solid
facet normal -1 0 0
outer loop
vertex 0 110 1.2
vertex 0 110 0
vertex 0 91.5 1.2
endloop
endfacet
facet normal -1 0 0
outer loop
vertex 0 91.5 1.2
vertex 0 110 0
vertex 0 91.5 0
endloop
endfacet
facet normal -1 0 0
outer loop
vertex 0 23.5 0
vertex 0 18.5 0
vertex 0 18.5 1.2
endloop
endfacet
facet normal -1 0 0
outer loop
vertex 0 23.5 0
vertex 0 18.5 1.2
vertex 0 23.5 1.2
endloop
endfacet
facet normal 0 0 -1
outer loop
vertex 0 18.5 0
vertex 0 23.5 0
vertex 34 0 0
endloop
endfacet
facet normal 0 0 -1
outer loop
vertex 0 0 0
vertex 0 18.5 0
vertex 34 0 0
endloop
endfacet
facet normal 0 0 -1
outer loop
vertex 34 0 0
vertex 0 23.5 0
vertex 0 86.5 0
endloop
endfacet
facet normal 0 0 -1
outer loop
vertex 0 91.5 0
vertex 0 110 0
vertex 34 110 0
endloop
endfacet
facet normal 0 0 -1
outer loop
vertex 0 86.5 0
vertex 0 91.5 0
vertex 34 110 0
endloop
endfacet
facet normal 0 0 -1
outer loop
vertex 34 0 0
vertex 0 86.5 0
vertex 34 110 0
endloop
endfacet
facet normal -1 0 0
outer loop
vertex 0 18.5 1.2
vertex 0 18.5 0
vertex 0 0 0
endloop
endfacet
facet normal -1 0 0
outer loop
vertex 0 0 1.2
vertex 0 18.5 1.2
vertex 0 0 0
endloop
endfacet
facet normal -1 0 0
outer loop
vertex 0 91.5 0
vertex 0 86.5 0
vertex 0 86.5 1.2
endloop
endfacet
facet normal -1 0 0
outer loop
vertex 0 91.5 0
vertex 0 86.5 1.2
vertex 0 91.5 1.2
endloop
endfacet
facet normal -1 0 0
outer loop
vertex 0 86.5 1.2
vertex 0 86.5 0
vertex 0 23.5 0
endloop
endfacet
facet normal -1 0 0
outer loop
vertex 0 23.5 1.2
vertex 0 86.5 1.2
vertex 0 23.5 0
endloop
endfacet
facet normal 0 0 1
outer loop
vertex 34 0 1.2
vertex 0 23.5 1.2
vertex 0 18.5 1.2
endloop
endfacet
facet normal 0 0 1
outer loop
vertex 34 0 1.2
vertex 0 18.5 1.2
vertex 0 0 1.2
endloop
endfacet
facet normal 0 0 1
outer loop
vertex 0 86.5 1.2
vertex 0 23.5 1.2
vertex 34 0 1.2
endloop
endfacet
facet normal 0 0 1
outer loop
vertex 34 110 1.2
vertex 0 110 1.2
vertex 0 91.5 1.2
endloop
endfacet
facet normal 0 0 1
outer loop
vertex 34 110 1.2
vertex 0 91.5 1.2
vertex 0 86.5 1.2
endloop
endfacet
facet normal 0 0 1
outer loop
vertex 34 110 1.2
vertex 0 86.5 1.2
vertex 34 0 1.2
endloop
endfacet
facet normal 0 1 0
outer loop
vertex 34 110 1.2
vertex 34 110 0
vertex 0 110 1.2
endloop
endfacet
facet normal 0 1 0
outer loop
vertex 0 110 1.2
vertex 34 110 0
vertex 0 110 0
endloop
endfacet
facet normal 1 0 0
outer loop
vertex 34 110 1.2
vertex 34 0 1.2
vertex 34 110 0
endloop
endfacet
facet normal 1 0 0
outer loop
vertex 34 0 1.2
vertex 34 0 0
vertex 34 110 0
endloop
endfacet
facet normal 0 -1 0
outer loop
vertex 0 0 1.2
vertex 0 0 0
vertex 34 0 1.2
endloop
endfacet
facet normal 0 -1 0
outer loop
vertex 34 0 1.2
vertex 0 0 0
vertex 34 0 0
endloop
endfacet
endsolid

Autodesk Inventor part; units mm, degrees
ref_plane "YZ Plane" through (0, 0, 0) normal (1, 0, 0) x (0, 1, 0)
ref_plane "XZ Plane" through (0, 0, 0) normal (0, 1, 0) x (-1, 0, 0)
ref_plane "XY Plane" through (0, 0, 0) normal (0, 0, 1) x (1, 0, 0)
sketch "Skizze1" plane through (0, 0, 0) normal (0, 0, 1) x (1, 0, 0)
  line L0 (0, 0) -> (34, 0)
  line L1 (34, 0) -> (34, 110)
  line L2 (34, 110) -> (0, 110)
  line L3 (0, 110) -> (0, 91.5)
  line L4 (0, 86.5) -> (0, 91.5)
  line L5 (0, 18.5) -> (0, 23.5)
  line L6 (0, 23.5) -> (0, 18.5) construction
  line L7 (0, 18.5) -> (0, 0)
  line L8 (0, 86.5) -> (0, 23.5)
  line L9 (0, 91.5) -> (0, 86.5) construction
  dimension "d0" = 34
  dimension "d1" = 110
extrude "Extrusion1" add sketch "Skizze1" along normal blind 1.2
properties part number "bett_V2_deckplatte_klappe" material "Holz (Walnuss)"
